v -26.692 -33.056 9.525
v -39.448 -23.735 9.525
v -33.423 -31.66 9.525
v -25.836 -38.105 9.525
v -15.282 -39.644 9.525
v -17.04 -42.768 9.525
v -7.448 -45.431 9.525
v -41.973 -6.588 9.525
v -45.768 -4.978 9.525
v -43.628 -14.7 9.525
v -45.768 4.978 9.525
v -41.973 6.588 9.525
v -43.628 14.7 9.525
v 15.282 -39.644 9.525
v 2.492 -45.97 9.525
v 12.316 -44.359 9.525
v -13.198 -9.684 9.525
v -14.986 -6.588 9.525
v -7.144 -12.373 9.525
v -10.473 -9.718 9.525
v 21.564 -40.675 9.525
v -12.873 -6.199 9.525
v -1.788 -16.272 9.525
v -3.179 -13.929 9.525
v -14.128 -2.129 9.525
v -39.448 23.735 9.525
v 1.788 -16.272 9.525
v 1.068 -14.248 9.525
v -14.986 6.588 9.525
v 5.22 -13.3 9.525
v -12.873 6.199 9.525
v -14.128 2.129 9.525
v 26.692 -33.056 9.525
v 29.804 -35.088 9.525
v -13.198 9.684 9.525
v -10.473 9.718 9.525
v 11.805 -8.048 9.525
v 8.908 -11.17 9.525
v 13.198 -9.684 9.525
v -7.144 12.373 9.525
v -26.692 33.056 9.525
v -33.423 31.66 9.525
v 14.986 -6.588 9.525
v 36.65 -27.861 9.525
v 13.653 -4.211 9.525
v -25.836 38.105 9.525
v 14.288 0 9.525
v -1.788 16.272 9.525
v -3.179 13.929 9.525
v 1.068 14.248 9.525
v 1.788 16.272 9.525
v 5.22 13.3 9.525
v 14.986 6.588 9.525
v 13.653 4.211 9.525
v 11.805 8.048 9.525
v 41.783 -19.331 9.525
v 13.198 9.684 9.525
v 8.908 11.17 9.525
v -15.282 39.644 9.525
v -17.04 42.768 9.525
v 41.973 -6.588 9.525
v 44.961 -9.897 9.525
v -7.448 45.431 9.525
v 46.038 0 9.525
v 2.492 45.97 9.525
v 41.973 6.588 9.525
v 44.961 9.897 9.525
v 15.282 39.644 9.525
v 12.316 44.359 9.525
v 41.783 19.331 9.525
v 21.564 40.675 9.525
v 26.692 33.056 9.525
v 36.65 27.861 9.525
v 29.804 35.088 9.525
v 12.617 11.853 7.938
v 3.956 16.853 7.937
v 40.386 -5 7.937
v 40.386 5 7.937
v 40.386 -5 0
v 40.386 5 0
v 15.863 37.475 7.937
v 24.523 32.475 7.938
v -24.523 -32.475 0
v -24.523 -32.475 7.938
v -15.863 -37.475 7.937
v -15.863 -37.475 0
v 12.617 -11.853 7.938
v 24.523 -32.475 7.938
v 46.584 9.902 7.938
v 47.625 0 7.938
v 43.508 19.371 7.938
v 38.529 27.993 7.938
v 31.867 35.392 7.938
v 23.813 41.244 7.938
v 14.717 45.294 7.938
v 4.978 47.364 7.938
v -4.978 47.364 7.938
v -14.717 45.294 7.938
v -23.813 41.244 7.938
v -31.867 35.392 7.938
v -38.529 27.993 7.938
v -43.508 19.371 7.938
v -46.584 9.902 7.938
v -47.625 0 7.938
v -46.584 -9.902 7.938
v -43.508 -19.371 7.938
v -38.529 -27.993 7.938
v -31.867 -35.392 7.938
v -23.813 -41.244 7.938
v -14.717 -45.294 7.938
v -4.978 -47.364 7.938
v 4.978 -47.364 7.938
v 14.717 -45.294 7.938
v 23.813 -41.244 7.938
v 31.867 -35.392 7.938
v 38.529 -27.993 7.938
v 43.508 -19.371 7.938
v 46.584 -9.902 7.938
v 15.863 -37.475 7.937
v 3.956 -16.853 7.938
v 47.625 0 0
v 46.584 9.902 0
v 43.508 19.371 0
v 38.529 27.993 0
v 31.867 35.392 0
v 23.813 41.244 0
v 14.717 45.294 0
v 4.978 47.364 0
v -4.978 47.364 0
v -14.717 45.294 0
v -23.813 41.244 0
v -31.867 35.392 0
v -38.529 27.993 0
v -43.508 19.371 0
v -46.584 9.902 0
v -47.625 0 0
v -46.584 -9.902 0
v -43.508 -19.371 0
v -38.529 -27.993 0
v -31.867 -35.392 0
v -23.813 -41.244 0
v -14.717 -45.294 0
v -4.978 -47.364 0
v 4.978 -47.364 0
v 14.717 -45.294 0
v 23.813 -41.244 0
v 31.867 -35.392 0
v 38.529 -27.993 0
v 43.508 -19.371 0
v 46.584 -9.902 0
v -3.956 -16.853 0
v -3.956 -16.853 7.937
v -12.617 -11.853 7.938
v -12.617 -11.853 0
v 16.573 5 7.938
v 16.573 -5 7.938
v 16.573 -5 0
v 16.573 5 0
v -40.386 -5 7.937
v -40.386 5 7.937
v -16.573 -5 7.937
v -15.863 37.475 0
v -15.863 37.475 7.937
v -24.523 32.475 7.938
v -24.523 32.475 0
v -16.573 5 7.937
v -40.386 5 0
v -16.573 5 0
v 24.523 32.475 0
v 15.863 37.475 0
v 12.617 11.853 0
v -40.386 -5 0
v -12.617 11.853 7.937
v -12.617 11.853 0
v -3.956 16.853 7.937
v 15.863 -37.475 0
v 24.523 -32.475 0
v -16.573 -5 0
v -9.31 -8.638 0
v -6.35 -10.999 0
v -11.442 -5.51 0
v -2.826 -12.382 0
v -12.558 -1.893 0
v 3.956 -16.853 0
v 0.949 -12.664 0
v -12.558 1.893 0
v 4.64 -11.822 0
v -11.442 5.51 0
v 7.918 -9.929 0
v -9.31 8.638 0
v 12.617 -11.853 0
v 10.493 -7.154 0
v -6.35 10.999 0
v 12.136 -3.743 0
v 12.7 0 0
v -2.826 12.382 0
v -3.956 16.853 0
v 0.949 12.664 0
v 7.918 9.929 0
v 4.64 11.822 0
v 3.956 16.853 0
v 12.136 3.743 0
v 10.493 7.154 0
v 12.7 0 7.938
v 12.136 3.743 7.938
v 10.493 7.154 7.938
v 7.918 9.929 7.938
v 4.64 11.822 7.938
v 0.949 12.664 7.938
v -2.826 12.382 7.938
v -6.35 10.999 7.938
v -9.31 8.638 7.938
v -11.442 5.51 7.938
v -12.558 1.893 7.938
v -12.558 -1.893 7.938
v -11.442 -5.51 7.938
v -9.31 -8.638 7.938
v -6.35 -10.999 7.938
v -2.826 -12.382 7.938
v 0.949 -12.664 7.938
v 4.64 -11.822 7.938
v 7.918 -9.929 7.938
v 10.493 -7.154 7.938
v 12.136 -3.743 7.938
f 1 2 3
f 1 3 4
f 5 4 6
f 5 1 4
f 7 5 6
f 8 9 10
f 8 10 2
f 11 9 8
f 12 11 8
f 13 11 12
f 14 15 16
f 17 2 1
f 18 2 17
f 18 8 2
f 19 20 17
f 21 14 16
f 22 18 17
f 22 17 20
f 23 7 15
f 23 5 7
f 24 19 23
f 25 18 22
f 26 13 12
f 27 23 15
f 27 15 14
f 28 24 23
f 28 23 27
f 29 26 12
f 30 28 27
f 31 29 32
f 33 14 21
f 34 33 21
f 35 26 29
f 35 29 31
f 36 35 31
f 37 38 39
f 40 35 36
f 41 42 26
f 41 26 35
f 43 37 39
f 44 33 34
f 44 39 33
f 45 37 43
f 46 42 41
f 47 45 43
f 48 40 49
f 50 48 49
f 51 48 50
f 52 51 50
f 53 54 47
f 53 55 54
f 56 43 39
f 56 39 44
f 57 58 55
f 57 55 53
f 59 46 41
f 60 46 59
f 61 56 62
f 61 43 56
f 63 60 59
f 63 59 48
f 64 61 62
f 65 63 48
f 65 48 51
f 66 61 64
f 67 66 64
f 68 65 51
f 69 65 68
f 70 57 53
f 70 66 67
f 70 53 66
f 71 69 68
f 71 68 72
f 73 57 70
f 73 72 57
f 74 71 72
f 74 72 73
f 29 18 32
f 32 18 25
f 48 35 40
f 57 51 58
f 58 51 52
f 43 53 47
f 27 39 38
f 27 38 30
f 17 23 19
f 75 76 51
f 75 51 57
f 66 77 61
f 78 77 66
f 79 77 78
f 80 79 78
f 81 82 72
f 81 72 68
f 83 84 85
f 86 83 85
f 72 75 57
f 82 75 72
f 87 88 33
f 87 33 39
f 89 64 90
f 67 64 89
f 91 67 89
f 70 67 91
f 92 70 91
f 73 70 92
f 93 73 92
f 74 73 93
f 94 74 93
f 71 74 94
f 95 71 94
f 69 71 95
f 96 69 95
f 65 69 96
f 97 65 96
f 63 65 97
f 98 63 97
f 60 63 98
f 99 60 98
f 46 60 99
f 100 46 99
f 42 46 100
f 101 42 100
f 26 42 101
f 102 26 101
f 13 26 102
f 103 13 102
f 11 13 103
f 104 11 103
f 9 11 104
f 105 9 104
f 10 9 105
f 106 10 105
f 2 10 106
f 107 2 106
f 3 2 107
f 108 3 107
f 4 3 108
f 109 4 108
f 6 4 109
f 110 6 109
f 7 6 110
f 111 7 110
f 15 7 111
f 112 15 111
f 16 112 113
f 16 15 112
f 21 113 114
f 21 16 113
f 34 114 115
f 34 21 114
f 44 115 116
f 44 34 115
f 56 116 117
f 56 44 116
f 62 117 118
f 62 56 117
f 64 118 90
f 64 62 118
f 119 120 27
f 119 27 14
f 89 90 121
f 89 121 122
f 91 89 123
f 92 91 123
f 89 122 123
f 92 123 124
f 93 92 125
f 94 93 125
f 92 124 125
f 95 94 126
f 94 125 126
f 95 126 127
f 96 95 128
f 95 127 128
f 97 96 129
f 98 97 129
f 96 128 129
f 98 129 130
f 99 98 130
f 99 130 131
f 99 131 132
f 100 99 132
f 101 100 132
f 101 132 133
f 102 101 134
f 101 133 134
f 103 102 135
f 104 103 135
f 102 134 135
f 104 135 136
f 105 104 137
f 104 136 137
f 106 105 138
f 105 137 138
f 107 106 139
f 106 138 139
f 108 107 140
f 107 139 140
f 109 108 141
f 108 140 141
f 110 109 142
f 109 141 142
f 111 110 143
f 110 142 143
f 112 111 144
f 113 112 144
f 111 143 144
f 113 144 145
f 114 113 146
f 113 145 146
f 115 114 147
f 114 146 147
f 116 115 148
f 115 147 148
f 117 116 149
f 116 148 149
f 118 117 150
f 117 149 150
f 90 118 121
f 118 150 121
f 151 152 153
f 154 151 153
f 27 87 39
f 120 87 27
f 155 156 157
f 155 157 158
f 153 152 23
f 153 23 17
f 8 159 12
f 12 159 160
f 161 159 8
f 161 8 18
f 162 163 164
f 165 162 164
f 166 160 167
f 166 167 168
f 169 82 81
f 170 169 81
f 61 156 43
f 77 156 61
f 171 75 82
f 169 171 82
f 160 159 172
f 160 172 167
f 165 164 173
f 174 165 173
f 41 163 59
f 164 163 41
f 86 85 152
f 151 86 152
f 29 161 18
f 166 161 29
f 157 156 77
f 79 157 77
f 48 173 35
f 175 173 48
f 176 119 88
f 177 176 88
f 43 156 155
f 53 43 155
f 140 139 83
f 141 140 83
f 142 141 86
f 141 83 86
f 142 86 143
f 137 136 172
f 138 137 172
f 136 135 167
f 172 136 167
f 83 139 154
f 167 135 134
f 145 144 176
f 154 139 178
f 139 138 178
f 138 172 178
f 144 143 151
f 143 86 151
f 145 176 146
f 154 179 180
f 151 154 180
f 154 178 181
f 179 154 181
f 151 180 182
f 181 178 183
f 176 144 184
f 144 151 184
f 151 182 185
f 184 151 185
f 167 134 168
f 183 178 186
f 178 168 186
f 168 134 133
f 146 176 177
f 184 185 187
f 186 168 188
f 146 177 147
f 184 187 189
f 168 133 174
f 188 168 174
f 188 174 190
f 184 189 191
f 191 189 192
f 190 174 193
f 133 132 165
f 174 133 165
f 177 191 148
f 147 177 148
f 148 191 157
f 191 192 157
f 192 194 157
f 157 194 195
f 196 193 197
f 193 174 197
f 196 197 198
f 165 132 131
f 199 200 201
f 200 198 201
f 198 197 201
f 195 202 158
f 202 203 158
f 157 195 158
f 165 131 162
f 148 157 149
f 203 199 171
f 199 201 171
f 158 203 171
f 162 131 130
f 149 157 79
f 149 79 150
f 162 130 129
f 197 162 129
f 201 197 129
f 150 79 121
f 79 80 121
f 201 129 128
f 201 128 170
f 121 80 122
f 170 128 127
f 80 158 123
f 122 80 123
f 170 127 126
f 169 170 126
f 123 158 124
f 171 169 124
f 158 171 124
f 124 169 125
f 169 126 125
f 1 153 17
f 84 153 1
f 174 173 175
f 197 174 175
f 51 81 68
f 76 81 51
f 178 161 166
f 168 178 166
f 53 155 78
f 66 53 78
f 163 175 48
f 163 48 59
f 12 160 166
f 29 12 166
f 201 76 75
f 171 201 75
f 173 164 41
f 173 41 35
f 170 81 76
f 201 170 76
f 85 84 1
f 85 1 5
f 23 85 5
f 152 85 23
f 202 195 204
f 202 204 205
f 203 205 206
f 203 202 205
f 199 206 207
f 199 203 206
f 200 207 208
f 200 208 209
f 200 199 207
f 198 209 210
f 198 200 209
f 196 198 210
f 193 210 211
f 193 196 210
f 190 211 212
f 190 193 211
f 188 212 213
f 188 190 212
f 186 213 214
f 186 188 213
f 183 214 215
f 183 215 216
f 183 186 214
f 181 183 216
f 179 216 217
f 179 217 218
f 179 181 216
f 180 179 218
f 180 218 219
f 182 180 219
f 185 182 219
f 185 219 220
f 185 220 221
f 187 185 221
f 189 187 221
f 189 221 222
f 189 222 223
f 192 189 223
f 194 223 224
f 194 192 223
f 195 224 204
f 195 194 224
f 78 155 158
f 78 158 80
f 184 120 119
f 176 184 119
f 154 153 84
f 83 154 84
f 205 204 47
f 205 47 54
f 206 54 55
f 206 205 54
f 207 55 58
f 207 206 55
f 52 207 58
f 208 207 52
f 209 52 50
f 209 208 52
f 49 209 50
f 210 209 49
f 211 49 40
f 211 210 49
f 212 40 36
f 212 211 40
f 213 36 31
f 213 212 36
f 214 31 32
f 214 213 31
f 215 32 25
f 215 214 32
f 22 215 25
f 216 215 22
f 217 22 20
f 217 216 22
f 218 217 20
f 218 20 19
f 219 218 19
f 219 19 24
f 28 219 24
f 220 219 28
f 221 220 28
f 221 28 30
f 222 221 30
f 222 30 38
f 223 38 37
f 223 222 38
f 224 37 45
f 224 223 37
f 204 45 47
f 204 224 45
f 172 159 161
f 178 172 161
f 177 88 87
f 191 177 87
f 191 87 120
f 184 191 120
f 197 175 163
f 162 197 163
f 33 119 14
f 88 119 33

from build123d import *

# Parameters (mm, degrees)
F0_R     = 47.625
F0_R_2   = 12.7
F1_DEPTH = 9.525
F2_W     = 23.8125
F2_H     = 10
F3_DEPTH = 9.526
F4_SIZE  = 1.5875


with BuildPart() as f1:
    # F0 (on Top) → F1 (new body)
    with BuildSketch(Plane.XY):
        Circle(F0_R)
        Circle(F0_R_2, mode=Mode.SUBTRACT)
    extrude(amount=F1_DEPTH)

    # F2 (on face) → F3 (cut, through all)
    with BuildSketch(Plane.XY.offset(9.525)):
        with Locations((-28.479498, 0)):
            Rectangle(F2_W, F2_H)
        Polygon((-12.616751, 11.852853), (-3.956497, 16.852853), (-15.862747, 37.475083), (-24.523001, 32.475083), align=None)
        Polygon((3.956497, 16.852853), (12.616751, 11.852853), (24.523001, 32.475083), (15.862747, 37.475083), align=None)
        with Locations((28.479498, 0)):
            Rectangle(F2_W, F2_H)
        Polygon((12.616751, -11.852853), (3.956497, -16.852853), (15.862747, -37.475083), (24.523001, -32.475083), align=None)
        Polygon((-3.956497, -16.852853), (-12.616751, -11.852853), (-24.523001, -32.475083), (-15.862747, -37.475083), align=None)
    extrude(amount=-F3_DEPTH, mode=Mode.SUBTRACT)

    # F4
    f4_edges = [f1.edges().sort_by_distance(p)[0] for p in [
        (-28.479498, 5, 9.525),
        (-40.385748, 0, 9.525),
        (-28.479498, -5, 9.525),
        (-16.573248, 0, 9.525),
        (-12.7, 0, 9.525),
        (-8.286624, 14.352853, 9.525),
        (-18.569876, 22.163968, 9.525),
        (-9.909622, 27.163968, 9.525),
        (-20.192874, 34.975083, 9.525),
        (9.909622, 27.163968, 9.525),
        (20.192874, 34.975083, 9.525),
        (8.286624, 14.352853, 9.525),
        (18.569876, 22.163968, 9.525),
        (16.573248, 0, 9.525),
        (28.479498, 5, 9.525),
        (40.385748, 0, 9.525),
        (28.479498, -5, 9.525),
        (18.569876, -22.163968, 9.525),
        (8.286624, -14.352853, 9.525),
        (9.909622, -27.163968, 9.525),
        (20.192874, -34.975083, 9.525),
        (-9.909622, -27.163968, 9.525),
        (-20.192874, -34.975083, 9.525),
        (-18.569876, -22.163968, 9.525),
        (-8.286624, -14.352853, 9.525),
        (-47.625, 0, 9.525),
    ]]
    chamfer(f4_edges, length=F4_SIZE)


solid = f1.part
